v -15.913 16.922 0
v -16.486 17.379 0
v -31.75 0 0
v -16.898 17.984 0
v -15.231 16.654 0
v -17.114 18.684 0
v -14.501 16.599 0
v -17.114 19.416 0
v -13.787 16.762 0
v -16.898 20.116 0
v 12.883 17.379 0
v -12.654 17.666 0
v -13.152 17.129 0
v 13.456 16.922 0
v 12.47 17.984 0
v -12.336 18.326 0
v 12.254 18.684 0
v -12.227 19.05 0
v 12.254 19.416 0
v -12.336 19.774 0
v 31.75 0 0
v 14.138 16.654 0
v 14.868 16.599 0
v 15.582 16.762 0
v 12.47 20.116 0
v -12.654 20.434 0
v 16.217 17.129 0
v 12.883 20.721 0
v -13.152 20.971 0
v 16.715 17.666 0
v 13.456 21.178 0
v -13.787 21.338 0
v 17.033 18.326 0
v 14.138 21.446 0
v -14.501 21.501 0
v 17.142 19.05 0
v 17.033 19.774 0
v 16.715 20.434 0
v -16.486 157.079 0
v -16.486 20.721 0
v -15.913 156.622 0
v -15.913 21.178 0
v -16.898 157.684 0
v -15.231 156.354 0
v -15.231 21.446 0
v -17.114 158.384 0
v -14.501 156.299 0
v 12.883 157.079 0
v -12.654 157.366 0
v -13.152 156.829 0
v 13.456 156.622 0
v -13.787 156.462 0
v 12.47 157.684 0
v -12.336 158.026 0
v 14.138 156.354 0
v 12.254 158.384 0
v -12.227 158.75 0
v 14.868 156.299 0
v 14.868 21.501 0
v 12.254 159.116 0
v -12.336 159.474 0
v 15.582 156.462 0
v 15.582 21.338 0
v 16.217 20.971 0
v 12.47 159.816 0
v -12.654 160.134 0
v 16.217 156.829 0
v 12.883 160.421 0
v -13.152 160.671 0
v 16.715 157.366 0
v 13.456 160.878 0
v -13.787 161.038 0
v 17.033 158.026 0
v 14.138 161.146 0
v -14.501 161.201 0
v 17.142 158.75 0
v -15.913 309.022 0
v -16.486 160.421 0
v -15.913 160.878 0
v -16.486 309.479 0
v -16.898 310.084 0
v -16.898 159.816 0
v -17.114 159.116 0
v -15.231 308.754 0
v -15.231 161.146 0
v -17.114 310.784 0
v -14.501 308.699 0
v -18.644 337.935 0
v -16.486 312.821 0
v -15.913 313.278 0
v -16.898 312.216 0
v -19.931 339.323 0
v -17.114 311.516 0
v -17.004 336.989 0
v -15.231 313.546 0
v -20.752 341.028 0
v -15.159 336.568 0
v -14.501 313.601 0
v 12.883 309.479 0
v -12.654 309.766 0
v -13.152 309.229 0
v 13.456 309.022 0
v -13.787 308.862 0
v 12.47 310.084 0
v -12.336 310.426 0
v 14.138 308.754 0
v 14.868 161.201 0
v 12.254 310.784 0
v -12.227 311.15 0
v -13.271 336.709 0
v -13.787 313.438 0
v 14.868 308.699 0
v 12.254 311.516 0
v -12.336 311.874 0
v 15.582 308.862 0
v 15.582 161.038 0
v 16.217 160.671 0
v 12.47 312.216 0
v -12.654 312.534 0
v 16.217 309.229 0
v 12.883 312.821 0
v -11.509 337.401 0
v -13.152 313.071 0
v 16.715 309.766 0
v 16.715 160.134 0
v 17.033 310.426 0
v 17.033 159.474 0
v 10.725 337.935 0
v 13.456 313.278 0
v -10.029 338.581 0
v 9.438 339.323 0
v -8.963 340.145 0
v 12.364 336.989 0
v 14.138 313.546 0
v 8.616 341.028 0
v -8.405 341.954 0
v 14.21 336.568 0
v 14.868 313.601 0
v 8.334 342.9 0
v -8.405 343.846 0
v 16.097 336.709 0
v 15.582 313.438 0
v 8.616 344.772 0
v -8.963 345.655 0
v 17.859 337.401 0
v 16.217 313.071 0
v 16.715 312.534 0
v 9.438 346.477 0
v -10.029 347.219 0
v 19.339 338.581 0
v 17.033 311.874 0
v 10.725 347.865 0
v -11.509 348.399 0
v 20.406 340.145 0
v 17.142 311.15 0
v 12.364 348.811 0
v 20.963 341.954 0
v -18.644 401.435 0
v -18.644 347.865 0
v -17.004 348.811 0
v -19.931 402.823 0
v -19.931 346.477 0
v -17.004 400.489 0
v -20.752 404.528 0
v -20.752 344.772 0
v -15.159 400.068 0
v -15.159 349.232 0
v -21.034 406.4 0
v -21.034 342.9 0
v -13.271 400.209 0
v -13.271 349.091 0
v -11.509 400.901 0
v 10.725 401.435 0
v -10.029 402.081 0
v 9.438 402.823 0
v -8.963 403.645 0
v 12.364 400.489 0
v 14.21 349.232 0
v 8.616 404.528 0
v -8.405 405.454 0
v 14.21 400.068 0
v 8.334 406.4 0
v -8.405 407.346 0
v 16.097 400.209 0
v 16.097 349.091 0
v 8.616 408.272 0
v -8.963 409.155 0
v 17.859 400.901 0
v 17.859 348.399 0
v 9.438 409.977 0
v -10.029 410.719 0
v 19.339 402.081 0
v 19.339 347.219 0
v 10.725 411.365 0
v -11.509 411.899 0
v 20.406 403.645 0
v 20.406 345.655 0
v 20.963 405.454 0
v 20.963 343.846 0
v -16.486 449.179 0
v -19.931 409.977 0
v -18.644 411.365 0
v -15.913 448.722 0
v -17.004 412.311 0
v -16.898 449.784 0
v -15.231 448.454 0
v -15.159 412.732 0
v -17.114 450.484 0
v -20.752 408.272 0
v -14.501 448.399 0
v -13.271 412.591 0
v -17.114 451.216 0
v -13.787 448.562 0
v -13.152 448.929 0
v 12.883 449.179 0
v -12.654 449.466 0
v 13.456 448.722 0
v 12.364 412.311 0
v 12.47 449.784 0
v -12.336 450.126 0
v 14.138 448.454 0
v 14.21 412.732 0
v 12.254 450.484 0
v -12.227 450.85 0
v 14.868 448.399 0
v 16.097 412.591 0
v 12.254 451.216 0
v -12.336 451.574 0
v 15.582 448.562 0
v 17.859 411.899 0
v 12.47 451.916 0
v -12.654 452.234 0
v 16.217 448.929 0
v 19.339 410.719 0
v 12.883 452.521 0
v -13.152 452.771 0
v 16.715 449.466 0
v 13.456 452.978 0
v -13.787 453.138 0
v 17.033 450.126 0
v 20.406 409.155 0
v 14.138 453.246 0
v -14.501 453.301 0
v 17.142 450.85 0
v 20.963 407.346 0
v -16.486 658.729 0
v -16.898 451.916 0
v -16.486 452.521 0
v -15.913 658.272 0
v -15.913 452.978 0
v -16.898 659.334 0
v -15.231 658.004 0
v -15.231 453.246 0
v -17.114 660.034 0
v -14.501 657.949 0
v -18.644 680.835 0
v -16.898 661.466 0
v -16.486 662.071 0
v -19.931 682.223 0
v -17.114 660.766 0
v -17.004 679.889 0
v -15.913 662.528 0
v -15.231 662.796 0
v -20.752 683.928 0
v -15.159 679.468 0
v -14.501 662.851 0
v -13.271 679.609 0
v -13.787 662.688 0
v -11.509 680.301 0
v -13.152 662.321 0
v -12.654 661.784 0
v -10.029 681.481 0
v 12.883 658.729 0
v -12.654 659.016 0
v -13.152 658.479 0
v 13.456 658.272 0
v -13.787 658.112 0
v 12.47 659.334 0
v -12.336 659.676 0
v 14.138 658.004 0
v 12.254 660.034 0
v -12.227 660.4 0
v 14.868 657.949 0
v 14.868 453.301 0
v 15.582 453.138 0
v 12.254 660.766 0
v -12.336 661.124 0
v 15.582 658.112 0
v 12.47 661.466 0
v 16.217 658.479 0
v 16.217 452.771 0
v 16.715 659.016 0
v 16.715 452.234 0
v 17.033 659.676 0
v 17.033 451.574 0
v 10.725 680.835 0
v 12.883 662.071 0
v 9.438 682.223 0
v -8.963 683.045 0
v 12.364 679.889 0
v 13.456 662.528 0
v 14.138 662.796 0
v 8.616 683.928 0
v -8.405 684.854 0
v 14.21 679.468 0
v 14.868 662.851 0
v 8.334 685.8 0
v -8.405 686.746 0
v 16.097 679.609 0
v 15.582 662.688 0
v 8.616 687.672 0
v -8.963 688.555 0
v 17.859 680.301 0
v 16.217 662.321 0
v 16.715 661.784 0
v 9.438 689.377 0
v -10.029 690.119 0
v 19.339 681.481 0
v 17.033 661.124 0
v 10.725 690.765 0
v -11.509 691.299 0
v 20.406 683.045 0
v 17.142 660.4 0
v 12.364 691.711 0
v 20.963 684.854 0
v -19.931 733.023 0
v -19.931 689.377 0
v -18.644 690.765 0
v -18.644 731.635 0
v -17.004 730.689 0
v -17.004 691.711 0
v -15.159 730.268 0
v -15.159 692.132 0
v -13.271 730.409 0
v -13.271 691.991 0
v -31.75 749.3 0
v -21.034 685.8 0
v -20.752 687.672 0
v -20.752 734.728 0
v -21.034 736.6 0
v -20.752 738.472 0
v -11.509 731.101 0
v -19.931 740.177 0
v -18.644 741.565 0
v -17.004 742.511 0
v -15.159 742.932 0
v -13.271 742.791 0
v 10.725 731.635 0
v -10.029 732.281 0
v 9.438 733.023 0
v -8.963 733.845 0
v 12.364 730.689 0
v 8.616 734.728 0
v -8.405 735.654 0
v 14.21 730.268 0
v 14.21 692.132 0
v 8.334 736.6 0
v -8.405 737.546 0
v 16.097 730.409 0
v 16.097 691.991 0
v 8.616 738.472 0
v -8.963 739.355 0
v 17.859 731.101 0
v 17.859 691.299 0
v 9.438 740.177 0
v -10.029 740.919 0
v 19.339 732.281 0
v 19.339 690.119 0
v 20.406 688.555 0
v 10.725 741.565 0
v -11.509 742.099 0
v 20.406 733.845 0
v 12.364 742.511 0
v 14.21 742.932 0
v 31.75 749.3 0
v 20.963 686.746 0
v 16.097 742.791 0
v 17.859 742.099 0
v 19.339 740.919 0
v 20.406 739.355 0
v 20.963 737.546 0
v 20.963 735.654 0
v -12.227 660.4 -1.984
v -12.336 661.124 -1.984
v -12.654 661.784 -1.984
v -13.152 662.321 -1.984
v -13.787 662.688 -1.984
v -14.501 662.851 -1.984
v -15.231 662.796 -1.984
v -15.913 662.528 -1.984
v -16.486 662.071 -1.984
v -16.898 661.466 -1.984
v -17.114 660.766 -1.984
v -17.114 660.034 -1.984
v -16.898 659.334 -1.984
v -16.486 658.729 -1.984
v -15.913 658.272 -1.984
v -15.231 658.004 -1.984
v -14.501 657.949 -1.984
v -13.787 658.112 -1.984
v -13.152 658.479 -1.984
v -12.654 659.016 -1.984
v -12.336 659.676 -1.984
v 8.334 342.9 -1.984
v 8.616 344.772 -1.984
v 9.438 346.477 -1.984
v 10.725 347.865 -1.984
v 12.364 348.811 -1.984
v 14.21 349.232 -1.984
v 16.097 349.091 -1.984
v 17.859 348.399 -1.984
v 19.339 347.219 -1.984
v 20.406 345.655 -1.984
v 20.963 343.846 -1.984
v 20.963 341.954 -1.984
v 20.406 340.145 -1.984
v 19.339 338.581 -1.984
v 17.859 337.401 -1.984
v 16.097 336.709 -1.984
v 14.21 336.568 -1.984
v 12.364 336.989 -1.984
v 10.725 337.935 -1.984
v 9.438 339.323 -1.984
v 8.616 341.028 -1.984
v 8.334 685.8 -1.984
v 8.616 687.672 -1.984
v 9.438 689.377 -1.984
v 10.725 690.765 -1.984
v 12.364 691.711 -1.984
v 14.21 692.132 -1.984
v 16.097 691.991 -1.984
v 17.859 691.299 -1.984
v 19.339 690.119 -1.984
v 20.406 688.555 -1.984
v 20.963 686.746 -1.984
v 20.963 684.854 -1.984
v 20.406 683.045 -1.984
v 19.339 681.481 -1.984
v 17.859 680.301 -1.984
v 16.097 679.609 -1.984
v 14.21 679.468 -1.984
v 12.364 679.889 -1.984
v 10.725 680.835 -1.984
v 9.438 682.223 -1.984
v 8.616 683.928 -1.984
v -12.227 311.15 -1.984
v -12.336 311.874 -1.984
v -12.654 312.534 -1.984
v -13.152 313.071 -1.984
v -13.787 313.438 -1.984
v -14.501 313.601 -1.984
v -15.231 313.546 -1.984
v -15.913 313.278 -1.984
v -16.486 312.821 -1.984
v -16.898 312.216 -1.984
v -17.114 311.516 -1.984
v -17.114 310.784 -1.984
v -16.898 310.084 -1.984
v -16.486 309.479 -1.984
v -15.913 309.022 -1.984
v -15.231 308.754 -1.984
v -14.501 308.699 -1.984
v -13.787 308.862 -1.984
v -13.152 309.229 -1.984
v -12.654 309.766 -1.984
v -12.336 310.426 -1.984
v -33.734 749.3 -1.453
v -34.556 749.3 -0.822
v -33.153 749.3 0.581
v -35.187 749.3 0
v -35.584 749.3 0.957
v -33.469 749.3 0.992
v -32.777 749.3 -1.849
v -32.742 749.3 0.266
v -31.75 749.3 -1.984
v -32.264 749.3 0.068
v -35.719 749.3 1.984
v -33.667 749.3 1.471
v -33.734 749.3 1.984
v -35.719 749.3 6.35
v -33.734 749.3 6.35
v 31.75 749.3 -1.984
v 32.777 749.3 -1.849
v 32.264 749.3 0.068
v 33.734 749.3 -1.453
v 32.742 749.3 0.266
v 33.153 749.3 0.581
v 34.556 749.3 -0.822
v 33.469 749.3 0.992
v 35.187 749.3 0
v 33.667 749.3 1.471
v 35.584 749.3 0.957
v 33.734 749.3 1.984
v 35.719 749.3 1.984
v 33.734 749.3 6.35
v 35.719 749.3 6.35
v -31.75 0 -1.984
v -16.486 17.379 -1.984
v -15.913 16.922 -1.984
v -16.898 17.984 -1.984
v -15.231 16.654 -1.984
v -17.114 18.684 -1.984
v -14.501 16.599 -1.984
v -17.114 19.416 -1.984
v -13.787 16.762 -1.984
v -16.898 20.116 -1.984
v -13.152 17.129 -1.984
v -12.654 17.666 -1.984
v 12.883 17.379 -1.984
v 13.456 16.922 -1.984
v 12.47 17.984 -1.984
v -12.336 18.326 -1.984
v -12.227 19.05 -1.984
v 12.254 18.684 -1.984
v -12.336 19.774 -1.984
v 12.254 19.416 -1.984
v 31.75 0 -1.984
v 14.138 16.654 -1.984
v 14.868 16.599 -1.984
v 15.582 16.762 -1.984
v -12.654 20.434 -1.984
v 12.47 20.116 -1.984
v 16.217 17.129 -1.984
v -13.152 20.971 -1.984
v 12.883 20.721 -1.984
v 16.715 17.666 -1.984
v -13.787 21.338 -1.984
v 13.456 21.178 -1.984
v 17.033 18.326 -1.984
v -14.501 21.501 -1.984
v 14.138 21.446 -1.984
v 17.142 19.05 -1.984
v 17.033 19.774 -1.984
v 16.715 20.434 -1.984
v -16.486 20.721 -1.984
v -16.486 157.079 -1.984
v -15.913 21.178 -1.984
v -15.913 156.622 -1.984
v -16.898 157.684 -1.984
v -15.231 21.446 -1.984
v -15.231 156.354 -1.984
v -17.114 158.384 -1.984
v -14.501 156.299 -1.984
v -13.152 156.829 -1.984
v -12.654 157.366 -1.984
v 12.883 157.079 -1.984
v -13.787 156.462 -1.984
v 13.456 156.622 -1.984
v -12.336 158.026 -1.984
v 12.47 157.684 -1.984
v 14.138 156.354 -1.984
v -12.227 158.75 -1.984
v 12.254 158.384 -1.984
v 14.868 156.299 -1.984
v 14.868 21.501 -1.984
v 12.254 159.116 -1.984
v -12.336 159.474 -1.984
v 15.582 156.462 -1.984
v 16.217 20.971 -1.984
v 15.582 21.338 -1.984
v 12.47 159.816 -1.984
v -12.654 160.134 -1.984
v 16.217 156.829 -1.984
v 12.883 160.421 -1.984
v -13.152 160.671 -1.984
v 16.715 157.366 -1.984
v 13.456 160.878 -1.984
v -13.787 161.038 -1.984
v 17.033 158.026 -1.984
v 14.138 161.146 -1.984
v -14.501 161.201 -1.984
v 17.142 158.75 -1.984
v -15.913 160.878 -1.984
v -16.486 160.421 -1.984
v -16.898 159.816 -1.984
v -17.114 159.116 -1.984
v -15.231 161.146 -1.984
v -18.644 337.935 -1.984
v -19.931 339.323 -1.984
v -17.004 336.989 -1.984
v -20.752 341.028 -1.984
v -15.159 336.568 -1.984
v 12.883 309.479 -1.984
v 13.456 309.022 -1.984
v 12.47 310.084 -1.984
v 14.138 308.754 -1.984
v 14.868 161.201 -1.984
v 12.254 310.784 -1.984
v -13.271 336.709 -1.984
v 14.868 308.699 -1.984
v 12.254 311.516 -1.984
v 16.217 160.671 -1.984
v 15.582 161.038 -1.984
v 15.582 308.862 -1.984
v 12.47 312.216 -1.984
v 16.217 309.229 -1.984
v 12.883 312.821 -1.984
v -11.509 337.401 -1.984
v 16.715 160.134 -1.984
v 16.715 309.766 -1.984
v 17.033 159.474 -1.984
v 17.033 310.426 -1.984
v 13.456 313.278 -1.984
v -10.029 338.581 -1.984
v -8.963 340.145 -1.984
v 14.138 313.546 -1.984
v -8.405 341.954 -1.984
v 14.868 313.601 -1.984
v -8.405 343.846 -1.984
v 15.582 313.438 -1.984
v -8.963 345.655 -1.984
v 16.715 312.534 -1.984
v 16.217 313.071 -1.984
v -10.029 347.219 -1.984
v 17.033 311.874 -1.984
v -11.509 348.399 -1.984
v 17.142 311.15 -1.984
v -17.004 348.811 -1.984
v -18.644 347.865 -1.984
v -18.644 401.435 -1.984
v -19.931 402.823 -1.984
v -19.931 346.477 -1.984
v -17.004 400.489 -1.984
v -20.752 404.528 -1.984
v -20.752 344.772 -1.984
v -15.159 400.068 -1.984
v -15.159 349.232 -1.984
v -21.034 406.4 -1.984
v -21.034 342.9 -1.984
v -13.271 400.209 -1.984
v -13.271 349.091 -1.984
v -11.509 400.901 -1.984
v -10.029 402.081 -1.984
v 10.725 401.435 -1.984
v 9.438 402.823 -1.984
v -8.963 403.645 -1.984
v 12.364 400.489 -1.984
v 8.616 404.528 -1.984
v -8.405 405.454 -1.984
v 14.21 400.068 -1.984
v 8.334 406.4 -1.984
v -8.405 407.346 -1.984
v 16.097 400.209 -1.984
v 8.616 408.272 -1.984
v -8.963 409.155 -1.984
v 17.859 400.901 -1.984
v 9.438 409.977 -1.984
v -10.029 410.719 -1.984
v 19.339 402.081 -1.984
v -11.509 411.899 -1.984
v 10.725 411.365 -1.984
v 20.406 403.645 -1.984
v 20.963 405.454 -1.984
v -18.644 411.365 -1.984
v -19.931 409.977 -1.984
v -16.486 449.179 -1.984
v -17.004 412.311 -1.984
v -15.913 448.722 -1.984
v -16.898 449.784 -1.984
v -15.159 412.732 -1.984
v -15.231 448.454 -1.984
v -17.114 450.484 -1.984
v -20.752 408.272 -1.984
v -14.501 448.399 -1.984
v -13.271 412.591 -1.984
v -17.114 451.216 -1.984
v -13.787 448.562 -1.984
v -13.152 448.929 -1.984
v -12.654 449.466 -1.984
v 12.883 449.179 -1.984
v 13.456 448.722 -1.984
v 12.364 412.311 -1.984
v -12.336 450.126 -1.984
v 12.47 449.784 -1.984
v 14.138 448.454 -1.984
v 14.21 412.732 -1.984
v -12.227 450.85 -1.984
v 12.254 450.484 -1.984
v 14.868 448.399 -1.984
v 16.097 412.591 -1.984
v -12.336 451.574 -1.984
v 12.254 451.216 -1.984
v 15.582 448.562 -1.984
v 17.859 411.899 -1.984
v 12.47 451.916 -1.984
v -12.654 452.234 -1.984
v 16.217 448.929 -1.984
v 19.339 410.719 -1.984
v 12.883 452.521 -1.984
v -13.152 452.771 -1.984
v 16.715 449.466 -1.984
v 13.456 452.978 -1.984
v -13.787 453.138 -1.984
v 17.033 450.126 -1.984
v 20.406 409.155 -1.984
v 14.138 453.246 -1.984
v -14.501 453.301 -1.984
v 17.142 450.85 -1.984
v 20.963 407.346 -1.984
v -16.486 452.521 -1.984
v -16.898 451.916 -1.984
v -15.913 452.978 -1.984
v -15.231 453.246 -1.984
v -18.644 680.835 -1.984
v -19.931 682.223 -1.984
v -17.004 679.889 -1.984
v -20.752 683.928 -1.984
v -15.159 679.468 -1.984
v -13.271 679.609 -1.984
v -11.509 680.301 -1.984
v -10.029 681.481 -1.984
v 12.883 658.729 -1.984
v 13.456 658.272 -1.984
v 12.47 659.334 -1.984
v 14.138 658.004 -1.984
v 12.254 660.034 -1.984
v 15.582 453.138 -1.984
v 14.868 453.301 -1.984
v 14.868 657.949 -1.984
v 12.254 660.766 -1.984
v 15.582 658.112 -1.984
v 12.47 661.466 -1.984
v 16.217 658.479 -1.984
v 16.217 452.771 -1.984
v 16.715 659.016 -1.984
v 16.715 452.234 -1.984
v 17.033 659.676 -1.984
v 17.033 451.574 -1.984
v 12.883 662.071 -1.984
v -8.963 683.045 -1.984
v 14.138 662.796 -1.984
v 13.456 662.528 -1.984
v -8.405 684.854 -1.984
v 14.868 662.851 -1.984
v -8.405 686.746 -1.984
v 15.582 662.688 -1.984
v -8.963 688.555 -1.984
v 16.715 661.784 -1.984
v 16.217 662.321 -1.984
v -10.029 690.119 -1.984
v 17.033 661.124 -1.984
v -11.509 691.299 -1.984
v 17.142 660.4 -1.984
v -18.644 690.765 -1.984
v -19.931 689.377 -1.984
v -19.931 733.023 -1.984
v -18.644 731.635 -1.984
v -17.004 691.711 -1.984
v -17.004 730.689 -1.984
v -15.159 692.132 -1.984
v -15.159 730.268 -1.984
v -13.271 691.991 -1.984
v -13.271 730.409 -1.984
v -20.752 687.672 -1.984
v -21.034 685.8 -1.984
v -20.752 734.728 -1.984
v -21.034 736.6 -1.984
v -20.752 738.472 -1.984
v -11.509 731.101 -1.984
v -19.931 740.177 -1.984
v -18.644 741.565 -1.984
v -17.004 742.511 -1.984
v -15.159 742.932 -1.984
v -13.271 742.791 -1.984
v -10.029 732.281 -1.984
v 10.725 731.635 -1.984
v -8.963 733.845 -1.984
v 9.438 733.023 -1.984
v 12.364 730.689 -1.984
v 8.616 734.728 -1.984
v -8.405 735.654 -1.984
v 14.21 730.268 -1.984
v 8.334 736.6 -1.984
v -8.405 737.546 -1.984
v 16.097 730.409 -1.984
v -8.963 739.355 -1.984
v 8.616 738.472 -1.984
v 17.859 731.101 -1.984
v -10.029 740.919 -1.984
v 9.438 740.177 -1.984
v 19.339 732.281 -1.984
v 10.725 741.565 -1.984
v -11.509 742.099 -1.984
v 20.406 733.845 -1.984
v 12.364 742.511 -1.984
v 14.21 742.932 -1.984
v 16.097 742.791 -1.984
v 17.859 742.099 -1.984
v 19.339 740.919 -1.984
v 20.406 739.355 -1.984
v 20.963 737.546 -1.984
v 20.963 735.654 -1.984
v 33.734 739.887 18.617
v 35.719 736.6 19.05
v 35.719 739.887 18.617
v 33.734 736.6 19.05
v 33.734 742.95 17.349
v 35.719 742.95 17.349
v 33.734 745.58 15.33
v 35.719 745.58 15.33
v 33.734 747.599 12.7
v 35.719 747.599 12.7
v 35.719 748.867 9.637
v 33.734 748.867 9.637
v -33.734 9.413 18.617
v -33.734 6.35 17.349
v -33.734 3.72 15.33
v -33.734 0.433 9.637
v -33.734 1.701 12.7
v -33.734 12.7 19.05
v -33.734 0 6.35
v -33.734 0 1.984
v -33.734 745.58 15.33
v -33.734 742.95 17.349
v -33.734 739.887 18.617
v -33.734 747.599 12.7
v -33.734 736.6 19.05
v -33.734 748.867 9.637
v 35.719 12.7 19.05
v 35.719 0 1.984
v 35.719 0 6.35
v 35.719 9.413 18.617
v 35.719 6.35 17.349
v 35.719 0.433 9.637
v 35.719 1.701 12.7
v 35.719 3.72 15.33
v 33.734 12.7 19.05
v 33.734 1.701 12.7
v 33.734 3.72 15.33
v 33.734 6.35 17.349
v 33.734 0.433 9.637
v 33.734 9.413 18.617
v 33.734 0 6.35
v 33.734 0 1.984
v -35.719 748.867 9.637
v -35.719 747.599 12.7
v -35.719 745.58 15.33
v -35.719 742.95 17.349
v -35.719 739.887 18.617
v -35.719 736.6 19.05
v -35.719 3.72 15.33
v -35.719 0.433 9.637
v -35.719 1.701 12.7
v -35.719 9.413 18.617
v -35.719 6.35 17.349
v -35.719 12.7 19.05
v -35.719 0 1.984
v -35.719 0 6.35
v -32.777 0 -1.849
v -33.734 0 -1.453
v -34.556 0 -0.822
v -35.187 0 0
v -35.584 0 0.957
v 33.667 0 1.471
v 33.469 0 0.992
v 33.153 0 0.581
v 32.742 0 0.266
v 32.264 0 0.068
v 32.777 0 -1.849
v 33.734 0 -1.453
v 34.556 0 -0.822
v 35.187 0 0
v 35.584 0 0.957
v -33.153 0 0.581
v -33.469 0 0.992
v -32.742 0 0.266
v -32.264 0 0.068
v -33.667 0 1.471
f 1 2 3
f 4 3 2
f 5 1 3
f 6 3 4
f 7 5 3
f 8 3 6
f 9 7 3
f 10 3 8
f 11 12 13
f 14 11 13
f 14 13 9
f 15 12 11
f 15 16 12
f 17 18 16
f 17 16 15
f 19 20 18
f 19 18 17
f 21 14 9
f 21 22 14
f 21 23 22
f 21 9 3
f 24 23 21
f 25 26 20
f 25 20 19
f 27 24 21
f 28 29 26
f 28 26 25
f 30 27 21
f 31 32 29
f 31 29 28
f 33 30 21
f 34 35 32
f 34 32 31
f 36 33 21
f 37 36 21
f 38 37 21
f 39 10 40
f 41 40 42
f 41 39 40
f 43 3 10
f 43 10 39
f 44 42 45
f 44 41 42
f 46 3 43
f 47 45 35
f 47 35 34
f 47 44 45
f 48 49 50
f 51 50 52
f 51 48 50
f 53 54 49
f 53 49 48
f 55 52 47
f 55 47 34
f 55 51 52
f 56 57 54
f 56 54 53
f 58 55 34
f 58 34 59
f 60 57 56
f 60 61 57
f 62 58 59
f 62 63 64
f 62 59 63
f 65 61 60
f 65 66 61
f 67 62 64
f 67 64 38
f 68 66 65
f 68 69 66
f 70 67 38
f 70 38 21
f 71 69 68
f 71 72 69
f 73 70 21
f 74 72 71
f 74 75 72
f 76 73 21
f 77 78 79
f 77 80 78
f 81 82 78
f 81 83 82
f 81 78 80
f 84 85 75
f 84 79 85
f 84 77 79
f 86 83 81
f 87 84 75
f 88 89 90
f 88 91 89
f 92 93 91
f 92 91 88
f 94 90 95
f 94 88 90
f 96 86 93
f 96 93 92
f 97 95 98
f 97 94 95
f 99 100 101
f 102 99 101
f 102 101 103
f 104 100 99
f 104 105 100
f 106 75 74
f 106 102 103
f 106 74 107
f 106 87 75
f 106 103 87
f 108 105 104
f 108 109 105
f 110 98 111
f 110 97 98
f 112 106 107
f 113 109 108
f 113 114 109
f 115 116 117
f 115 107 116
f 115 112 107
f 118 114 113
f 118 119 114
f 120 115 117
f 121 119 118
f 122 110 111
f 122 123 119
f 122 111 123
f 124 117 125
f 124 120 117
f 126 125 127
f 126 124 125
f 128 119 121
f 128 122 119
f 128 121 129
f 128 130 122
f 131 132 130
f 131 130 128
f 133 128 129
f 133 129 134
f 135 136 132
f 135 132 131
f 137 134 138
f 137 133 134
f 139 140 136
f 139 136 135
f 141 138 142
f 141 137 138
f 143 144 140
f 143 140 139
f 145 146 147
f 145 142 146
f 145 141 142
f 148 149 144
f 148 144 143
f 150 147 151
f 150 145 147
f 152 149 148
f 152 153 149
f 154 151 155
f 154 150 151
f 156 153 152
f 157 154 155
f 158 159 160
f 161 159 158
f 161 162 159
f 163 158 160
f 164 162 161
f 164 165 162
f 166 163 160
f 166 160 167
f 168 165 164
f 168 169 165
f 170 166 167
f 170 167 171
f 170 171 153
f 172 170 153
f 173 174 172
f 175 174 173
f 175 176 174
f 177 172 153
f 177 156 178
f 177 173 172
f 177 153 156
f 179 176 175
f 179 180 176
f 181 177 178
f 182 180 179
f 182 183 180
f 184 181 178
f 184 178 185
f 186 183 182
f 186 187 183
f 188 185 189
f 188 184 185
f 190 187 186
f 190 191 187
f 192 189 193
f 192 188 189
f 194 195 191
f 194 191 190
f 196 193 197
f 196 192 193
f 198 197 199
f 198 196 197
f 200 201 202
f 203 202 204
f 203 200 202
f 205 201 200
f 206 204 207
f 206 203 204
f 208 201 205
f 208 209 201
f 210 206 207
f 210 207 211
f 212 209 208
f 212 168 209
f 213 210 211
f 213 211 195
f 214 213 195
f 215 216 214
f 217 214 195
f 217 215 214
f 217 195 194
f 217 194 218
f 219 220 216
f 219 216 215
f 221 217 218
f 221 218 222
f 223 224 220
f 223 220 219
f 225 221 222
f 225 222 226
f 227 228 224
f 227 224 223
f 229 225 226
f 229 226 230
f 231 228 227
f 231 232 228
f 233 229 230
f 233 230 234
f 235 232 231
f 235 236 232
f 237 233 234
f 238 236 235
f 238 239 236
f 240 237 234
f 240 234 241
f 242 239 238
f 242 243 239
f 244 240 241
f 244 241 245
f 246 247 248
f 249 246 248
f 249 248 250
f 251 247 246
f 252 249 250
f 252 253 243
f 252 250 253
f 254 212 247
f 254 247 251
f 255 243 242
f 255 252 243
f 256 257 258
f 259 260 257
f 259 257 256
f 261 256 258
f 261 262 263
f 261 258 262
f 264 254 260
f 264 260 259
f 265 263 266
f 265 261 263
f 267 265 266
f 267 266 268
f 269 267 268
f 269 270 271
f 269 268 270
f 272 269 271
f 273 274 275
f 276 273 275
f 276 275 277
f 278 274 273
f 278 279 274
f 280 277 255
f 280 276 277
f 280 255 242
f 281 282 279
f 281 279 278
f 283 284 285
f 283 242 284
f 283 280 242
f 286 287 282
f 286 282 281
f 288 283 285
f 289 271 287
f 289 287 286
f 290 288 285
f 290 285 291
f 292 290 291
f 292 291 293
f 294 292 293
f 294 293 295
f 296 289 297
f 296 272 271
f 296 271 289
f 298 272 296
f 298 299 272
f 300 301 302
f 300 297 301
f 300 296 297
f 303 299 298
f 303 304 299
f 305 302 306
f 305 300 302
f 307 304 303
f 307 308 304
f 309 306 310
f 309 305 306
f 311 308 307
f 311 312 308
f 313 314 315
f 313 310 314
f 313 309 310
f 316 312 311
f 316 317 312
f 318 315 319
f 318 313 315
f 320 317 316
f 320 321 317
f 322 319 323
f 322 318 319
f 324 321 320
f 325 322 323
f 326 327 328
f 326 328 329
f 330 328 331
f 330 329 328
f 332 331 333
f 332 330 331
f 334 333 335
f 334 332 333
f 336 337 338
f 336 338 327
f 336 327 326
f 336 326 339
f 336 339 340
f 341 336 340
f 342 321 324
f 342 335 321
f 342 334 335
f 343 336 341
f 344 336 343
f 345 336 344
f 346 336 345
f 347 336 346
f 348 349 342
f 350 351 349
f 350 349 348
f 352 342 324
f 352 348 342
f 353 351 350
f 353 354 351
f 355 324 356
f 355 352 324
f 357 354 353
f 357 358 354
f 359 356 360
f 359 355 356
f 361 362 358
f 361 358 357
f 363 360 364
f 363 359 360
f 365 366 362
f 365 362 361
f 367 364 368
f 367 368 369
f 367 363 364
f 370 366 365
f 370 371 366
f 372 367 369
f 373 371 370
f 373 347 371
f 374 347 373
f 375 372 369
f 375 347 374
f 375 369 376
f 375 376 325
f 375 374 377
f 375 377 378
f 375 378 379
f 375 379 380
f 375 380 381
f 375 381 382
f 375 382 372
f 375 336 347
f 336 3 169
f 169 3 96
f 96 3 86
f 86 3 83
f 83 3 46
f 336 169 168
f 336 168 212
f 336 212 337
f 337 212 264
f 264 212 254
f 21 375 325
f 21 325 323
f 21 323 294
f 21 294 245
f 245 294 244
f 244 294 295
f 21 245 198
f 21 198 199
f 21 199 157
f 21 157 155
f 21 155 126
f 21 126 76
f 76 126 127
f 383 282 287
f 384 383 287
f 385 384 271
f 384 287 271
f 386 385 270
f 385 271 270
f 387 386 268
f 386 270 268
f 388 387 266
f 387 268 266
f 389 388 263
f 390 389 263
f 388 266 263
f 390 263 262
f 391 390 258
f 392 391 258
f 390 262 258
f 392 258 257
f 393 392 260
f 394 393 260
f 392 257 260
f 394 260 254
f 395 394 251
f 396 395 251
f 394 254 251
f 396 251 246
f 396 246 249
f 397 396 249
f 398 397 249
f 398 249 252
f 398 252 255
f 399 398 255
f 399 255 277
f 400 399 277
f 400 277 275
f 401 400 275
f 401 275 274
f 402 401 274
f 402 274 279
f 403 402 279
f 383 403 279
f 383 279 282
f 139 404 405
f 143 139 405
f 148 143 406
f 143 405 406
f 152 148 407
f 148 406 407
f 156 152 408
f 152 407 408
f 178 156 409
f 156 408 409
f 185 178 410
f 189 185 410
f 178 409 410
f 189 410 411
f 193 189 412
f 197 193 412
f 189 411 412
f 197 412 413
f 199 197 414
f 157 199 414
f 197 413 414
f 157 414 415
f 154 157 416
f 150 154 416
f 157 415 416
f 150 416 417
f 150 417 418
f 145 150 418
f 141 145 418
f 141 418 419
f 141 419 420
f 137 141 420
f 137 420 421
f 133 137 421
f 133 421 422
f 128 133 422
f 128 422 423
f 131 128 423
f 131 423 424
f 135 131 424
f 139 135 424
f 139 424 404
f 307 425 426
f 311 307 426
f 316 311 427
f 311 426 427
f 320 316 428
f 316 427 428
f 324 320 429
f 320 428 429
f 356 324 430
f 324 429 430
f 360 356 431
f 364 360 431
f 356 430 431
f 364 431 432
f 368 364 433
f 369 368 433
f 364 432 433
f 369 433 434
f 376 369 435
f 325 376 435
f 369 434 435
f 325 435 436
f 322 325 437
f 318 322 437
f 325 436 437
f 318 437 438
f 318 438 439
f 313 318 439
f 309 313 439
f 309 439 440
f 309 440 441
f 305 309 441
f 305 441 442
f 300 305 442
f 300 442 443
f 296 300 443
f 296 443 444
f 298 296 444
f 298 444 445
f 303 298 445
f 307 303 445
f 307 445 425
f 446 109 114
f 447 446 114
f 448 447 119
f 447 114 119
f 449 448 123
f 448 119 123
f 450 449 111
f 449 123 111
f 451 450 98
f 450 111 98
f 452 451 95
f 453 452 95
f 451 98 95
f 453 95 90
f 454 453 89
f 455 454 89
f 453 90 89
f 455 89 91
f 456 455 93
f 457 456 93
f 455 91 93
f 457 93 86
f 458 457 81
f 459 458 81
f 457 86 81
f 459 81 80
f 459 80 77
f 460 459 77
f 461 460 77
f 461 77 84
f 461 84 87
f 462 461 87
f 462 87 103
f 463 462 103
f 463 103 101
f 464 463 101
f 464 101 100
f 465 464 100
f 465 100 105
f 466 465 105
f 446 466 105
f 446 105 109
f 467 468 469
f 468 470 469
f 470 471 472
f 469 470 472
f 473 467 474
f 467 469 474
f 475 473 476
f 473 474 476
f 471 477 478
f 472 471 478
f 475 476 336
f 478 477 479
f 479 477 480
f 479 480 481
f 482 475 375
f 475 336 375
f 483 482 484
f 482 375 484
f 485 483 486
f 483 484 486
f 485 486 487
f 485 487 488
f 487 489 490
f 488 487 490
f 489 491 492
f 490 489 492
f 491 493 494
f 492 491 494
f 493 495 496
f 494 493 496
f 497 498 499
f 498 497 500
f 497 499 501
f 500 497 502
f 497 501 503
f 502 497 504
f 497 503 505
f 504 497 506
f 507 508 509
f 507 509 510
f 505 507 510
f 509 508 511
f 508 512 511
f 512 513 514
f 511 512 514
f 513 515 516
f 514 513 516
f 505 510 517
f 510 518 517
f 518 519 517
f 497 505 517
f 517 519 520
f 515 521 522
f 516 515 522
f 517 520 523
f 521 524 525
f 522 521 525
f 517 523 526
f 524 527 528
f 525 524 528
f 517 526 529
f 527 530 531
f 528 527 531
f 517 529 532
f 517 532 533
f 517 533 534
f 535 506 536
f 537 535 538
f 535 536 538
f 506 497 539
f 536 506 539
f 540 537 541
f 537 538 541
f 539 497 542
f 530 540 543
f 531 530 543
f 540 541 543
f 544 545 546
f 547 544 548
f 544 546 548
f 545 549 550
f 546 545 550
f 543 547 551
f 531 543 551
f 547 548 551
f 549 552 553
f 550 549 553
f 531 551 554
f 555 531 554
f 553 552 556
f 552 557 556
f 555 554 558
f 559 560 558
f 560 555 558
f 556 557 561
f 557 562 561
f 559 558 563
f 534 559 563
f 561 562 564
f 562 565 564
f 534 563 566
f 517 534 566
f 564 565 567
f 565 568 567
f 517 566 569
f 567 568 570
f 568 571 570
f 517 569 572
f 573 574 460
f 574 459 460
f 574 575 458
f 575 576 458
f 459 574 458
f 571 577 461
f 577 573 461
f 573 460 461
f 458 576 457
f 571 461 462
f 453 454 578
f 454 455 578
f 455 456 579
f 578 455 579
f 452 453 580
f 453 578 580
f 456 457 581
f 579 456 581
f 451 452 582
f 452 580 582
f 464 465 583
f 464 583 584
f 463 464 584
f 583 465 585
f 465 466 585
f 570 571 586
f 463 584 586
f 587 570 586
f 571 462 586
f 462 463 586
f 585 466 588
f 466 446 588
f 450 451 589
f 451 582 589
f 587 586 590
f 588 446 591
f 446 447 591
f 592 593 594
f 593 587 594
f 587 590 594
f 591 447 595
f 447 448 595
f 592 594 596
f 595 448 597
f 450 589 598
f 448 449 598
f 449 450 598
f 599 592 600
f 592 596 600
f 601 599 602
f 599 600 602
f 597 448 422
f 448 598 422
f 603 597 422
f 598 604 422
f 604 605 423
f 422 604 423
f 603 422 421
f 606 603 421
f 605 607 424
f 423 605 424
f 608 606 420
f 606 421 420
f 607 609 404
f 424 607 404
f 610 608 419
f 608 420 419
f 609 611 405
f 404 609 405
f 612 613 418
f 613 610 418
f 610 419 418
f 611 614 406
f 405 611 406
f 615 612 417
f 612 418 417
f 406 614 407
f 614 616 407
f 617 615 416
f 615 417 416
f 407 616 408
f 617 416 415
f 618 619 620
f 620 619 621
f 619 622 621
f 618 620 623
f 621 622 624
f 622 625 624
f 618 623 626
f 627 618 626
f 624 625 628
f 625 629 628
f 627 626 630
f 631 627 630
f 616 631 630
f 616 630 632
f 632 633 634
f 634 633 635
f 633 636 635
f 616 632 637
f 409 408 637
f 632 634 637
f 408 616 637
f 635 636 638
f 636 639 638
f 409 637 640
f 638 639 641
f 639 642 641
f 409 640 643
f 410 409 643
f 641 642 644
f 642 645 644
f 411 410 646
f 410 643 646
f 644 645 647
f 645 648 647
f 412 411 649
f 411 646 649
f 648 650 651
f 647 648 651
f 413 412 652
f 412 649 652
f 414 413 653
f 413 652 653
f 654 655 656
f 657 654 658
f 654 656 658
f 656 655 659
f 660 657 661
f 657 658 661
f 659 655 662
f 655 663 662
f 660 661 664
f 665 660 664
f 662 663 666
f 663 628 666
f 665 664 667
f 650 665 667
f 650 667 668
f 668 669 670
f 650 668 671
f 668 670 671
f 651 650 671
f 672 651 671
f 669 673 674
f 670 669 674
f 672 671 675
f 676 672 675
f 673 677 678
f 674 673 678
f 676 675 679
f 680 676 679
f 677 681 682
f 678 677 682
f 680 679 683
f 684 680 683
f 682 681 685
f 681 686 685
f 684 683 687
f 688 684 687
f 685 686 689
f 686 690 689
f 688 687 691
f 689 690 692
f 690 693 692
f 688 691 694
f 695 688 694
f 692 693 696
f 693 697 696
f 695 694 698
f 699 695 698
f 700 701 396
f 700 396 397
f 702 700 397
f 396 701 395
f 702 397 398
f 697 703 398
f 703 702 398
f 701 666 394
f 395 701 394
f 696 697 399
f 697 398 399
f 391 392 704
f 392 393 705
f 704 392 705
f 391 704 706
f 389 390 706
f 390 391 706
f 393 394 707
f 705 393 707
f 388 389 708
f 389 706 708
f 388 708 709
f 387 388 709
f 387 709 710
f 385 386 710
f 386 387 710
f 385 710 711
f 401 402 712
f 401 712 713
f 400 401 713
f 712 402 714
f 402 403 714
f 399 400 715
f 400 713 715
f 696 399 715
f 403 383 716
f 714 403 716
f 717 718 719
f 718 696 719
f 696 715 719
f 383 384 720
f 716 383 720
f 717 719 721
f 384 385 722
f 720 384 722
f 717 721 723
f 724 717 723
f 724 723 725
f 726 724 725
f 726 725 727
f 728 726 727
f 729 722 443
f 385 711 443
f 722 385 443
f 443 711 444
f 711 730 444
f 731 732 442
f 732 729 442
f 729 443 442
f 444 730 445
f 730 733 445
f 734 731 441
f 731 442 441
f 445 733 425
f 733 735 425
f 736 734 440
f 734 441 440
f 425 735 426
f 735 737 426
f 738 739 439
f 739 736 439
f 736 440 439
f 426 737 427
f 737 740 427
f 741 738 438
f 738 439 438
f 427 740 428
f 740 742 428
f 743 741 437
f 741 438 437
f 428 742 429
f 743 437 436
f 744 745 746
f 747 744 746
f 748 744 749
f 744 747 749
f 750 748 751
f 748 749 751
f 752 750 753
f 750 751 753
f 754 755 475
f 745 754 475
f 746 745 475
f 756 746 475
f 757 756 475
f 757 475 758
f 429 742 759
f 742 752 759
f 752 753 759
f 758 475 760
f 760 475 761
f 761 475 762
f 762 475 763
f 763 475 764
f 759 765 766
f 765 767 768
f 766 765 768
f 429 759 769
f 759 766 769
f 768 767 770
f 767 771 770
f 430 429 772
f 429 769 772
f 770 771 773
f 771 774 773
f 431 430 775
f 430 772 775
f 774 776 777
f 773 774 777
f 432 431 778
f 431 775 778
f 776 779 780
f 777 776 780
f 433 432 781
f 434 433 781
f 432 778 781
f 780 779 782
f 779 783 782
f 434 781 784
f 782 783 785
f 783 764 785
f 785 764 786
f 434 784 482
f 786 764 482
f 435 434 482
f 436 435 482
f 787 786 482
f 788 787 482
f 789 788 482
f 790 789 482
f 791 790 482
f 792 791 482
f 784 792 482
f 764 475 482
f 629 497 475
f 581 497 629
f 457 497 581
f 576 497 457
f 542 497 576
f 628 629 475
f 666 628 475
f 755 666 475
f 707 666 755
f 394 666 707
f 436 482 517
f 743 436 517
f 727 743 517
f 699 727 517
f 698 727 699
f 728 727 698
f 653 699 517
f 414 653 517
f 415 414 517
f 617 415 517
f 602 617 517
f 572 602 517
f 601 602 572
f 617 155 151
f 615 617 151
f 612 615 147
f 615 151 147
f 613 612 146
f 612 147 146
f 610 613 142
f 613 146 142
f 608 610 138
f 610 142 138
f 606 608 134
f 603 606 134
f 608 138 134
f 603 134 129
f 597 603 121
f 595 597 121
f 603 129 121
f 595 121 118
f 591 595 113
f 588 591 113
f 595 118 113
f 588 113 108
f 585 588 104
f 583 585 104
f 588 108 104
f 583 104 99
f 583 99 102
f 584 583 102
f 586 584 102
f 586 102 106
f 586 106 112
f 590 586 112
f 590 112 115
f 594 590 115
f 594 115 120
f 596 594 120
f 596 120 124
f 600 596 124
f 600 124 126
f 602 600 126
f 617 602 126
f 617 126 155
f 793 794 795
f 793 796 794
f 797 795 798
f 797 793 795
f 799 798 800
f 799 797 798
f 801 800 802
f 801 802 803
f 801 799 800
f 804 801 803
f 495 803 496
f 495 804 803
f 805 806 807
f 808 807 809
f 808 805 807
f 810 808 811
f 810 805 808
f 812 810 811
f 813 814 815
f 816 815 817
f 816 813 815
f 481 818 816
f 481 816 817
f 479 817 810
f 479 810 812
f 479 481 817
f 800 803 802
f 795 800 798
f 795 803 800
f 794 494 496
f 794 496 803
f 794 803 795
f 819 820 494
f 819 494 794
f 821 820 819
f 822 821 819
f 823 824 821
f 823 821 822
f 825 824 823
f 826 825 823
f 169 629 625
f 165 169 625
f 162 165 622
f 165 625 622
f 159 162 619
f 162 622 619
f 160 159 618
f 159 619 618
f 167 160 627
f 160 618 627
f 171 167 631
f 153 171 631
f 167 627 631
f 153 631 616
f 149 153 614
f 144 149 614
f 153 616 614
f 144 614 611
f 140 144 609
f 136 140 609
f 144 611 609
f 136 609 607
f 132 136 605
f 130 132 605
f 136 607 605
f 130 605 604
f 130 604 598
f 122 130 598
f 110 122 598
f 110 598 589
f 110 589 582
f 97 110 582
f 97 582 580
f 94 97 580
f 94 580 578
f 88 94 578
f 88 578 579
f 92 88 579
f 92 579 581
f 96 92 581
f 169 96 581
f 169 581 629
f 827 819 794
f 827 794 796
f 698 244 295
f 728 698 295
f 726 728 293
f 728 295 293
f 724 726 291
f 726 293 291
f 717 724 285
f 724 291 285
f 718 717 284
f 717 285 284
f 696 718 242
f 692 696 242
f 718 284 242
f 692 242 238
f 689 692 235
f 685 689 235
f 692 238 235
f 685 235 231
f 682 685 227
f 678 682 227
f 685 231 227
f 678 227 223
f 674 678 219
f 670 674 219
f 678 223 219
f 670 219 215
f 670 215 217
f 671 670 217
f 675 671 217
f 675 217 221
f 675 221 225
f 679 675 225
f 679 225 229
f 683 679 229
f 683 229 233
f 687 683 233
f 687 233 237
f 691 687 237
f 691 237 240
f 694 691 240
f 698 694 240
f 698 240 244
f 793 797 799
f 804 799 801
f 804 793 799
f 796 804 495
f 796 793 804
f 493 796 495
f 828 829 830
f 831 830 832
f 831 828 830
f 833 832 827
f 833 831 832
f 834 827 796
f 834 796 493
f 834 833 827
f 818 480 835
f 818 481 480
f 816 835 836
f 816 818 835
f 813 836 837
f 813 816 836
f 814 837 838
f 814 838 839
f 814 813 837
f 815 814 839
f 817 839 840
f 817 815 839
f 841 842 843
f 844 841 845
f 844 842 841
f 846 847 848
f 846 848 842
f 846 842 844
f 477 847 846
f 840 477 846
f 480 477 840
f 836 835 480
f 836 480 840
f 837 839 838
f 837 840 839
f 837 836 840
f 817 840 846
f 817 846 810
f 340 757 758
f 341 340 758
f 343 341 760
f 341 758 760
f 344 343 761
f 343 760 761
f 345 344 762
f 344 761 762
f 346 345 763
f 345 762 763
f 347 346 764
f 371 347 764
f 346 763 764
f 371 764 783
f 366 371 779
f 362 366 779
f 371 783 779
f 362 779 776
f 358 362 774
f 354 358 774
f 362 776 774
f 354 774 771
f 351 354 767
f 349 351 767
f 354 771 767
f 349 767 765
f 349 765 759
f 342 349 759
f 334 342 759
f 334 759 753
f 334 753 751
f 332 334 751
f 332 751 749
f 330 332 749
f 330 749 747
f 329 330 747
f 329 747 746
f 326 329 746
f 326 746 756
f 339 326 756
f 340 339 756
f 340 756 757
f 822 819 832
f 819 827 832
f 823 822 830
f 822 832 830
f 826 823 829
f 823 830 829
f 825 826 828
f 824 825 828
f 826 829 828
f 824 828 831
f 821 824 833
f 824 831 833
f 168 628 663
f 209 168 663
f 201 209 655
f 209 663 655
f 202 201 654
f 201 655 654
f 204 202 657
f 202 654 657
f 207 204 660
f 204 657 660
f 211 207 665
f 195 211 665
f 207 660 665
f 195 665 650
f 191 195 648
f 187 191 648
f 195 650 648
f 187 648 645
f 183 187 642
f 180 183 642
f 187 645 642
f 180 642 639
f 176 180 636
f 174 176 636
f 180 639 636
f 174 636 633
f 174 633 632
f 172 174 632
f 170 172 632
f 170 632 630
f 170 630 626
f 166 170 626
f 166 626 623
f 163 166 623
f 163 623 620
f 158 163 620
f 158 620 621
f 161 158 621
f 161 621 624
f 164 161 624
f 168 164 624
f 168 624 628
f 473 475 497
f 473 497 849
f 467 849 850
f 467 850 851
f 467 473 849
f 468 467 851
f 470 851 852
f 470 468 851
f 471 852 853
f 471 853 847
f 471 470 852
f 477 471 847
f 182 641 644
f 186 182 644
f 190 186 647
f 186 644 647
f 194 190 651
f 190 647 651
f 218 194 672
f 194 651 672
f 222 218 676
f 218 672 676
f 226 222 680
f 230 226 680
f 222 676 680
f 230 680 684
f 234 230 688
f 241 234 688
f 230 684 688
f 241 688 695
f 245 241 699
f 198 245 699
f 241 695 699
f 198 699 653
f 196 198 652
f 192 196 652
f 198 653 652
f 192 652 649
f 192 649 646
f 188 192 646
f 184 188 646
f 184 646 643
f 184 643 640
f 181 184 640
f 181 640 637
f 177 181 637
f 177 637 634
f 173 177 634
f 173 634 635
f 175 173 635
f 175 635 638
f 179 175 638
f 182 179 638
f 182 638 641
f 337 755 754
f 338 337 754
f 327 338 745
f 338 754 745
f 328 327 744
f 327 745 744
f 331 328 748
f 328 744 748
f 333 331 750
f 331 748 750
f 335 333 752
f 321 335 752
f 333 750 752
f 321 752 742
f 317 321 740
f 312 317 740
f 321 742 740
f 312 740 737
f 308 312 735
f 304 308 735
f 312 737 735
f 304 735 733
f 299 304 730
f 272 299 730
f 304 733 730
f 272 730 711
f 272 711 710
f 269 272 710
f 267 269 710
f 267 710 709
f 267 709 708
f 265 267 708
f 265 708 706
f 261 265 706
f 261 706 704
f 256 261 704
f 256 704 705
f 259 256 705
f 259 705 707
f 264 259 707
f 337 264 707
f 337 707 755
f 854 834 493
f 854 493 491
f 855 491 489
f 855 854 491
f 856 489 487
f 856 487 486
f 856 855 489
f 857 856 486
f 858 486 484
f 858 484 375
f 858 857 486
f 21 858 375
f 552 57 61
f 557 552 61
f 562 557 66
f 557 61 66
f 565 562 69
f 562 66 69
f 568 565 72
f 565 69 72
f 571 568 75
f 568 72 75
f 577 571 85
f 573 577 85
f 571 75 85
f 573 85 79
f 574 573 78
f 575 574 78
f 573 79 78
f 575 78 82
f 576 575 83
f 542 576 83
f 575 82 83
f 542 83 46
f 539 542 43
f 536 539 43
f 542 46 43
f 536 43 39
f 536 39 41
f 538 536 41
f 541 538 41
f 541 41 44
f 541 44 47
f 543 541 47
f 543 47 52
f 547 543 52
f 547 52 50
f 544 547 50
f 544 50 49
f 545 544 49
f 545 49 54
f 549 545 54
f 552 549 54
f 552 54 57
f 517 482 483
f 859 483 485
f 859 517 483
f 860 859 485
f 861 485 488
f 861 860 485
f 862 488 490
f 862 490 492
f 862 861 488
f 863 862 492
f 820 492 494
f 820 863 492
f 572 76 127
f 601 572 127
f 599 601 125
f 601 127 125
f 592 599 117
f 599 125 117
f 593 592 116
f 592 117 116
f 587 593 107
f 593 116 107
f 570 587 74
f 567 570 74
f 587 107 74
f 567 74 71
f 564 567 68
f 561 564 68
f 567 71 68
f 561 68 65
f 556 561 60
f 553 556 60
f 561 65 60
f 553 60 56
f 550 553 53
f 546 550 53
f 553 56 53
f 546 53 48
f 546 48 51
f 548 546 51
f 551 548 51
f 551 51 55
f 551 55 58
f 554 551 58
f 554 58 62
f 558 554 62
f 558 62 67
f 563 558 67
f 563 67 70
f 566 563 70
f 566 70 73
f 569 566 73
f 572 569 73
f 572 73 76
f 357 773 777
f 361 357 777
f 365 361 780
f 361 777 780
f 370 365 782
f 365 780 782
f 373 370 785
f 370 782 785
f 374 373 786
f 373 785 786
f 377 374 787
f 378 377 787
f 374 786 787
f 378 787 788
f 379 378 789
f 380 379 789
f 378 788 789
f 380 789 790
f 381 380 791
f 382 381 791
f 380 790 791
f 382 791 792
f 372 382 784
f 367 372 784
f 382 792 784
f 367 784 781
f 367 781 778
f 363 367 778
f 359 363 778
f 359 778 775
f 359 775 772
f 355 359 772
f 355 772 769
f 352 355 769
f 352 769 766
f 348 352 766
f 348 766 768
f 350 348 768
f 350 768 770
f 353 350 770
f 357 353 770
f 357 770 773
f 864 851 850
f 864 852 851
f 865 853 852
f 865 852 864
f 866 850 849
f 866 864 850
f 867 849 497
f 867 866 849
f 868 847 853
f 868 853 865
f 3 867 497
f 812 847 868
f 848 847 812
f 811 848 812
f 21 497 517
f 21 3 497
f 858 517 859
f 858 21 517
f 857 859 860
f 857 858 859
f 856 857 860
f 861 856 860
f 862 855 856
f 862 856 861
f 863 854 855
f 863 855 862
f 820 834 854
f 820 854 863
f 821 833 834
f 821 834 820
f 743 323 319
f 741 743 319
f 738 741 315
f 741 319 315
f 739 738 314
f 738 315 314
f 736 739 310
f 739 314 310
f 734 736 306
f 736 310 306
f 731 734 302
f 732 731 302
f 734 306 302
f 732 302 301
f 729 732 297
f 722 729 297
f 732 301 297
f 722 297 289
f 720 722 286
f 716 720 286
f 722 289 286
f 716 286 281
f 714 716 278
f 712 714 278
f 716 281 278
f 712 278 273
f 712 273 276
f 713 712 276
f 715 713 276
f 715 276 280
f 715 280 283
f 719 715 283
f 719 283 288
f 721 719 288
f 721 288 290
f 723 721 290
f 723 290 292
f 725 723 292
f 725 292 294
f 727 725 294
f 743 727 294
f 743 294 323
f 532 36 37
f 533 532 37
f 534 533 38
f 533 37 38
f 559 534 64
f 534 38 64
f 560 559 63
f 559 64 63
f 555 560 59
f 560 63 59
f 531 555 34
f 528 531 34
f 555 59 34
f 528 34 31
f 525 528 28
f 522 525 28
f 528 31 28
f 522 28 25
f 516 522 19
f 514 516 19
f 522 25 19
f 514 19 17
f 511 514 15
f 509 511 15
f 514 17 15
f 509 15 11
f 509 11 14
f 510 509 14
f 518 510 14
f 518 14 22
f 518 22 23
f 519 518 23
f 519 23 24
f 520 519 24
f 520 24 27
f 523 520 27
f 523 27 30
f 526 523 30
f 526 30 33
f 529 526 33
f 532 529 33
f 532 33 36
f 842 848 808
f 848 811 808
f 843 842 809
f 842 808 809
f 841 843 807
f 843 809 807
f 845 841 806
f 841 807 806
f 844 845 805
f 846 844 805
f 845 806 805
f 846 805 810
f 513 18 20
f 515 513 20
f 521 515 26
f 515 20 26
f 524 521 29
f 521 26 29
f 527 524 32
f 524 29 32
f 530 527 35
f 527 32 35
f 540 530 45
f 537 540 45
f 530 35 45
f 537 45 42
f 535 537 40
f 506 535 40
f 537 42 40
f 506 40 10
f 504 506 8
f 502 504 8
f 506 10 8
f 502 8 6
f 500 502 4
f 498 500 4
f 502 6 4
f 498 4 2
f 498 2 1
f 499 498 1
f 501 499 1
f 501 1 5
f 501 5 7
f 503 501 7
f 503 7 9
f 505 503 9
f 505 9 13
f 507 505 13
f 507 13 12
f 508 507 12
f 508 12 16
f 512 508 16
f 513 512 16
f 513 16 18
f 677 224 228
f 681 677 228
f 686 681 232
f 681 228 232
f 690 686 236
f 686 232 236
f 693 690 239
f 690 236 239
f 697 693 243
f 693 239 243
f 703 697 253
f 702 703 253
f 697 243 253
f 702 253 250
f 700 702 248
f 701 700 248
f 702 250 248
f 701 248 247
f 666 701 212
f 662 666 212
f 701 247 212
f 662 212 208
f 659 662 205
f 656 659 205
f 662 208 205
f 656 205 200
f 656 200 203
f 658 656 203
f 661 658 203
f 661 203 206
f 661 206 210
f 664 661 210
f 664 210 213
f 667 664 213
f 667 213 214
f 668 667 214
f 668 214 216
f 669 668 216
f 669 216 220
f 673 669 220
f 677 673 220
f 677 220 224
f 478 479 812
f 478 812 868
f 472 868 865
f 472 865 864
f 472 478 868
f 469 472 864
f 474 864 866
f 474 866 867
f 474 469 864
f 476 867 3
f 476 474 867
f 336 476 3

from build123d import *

# Parameters (mm, degrees)
SKETCH1_W                   = 63.5
SKETCH1_H                   = 749.3
BASE_FLANGE1_DEPTH          = 1.984375
F_1_2_0_5_DIAMETER_HOLE1_D  = 12.7
F_1_2_0_5_DIAMETER_HOLE2_D  = 12.7
EDGE_FLANGE2_DEPTH          = 749.3
EDGE_FLANGE2_BEND_DEPTH     = 749.3
F_10_0_201_DIAMETER_HOLE1_D = 4.9149
FILLET1_R                   = 12.7


# Sheet-metal steps are written as plain solids
with BuildPart() as part:
    # Sketch1 → Base-Flange1 (new body)
    with BuildSketch(Plane.XY):
        with Locations((0, 374.65)):
            Rectangle(SKETCH1_W, SKETCH1_H)
    extrude(amount=-BASE_FLANGE1_DEPTH)

    # 1/2 (0.5) Diameter Hole1 (through all)
    with Locations(Plane.XY):
        with Locations((-14.684375, 406.4), (14.684375, 406.4), (14.684375, 342.9), (-14.684375, 342.9)):
            Hole(F_1_2_0_5_DIAMETER_HOLE1_D / 2)

    # 1/2 (0.5) Diameter Hole2 (through all)
    with Locations(Plane.XY):
        with Locations((14.684375, 685.8), (14.684375, 736.6), (-14.684375, 736.6), (-14.684375, 685.8)):
            Hole(F_1_2_0_5_DIAMETER_HOLE2_D / 2)

    # Edge-Flange2 section (across the edge) → Edge-Flange2 (add)
    with BuildSketch(Plane(origin=(-33.734375, 749.3, 0), x_dir=(1, 0, 0), z_dir=(0, -1, 0))):
        with BuildLine():
            Line((-1.984375, 1.984375), (-1.984375, 19.05))
            Line((-1.984375, 19.05), (0, 19.05))
            Line((0, 19.05), (0, 1.984375))
            ThreePointArc((0, 1.984375), (0.581209981, 0.581209981), (1.984375, 0))
            Line((1.984375, 0), (1.984375, -1.984375))
            ThreePointArc((1.984375, -1.984375), (-0.821955038, -0.821955038), (-1.984375, 1.984375))
        make_face()
    extrude(amount=EDGE_FLANGE2_DEPTH)

    # Edge-Flange2 section 2 (across the edge) → Edge-Flange2 bend (add)
    with BuildSketch(Plane(origin=(33.734375, 0, 0), x_dir=(-1, 0, 0), z_dir=(0, 1, 0))):
        with BuildLine():
            Line((-1.984375, 1.984375), (-1.984375, 19.05))
            Line((-1.984375, 19.05), (0, 19.05))
            Line((0, 19.05), (0, 1.984375))
            ThreePointArc((0, 1.984375), (0.581209981, 0.581209981), (1.984375, 0))
            Line((1.984375, 0), (1.984375, -1.984375))
            ThreePointArc((1.984375, -1.984375), (-0.821955038, -0.821955038), (-1.984375, 1.984375))
        make_face()
    extrude(amount=EDGE_FLANGE2_BEND_DEPTH)

    # #10 (0.201) Diameter Hole1 (through all)
    with Locations(Plane(origin=(0, 0, -1.984375), x_dir=(-1, 0, 0), z_dir=(0, 0, -1))):
        with Locations((-14.684375, 19.05), (14.684375, 19.05), (-14.684375, 158.75), (14.684375, 158.75), (-14.684375, 311.15), (14.684375, 311.15), (-14.684375, 450.85), (14.684375, 450.85), (-14.684375, 660.4), (14.684375, 660.4)):
            Hole(F_10_0_201_DIAMETER_HOLE1_D / 2)

    # Fillet1
    fillet1_edges = [part.edges().sort_by_distance(p)[0] for p in [
        (-34.7265625, 749.3, 19.05),
        (-34.7265625, 0, 19.05),
        (34.7265625, 0, 19.05),
        (34.7265625, 749.3, 19.05),
    ]]
    fillet(fillet1_edges, radius=FILLET1_R)


solid = part.part
